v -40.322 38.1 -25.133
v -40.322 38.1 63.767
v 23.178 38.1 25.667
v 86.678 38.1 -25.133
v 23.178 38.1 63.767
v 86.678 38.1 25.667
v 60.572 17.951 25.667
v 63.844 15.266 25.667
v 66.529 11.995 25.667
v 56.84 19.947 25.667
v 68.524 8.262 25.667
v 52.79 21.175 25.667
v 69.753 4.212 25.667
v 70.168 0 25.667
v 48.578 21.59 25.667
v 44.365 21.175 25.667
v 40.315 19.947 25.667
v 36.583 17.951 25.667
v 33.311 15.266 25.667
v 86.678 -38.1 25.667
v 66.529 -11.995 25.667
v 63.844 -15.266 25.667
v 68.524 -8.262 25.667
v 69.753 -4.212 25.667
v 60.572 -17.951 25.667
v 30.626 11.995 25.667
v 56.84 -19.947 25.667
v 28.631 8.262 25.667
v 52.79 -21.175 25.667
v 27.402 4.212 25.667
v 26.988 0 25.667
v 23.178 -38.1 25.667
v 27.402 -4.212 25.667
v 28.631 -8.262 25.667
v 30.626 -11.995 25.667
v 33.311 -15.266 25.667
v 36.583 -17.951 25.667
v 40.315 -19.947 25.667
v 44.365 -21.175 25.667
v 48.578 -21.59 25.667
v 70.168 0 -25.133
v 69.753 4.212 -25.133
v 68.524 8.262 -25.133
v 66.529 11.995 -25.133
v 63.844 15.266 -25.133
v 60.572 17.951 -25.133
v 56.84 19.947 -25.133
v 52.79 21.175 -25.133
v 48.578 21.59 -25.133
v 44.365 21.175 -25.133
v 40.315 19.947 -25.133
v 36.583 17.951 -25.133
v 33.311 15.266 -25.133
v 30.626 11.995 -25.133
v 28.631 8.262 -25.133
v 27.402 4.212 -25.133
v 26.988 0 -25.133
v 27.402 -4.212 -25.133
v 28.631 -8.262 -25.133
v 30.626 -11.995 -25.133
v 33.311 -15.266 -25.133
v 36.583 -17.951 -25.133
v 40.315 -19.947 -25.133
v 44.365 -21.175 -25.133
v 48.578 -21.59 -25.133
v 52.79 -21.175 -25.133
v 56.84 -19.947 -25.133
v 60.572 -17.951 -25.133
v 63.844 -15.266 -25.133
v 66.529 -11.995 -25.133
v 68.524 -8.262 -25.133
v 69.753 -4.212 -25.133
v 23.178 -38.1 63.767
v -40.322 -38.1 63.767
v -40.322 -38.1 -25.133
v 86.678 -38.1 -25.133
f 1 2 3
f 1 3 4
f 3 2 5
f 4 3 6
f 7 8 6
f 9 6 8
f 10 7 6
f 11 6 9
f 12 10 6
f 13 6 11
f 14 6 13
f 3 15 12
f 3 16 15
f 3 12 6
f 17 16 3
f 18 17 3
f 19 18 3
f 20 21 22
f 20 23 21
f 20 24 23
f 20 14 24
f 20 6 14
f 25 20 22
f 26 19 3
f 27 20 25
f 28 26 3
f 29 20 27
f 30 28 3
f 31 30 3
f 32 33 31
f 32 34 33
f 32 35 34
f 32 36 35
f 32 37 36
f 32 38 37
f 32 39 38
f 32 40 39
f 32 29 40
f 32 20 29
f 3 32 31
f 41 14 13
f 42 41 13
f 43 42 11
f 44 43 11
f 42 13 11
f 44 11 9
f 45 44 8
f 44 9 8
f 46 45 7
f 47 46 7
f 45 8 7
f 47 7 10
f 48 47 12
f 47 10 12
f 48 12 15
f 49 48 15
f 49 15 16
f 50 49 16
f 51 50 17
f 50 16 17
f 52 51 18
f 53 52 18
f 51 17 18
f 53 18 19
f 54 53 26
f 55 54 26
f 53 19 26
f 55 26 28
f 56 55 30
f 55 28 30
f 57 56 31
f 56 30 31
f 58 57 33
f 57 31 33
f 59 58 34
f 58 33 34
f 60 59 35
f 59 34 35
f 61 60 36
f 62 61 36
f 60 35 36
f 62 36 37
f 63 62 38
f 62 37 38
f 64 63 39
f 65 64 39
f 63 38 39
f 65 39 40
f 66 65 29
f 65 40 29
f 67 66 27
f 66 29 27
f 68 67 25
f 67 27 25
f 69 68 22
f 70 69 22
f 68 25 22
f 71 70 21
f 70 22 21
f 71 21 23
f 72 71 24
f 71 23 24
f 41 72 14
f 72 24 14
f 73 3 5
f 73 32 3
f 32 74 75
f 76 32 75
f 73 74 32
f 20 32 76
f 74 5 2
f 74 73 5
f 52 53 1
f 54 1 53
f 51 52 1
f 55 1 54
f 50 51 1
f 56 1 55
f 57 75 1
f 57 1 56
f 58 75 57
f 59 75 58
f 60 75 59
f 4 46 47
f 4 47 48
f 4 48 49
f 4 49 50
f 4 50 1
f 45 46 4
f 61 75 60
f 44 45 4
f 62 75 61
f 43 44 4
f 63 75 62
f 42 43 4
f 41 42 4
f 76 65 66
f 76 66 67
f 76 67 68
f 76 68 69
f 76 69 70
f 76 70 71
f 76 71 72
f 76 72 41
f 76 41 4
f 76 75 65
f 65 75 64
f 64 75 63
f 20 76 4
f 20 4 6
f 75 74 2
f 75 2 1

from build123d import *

# Parameters (mm, degrees)
F1_DEPTH      = 38.1
F1_DEPTH_BACK = 38.1
F2_R          = 21.59
F3_DEPTH      = 50.8


with BuildPart() as f1:
    # F0 (on Front) → F1 (new body, two sides)
    with BuildSketch(Plane.XZ) as f1_sk:
        Polygon((23.1775, 63.766758), (-40.3225, 63.766758), (-40.3225, -25.133242), (23.1775, -25.133242), (86.6775, -25.133242), (86.6775, 25.666758), (23.1775, 25.666758), align=None)
    extrude(amount=F1_DEPTH)
    extrude(f1_sk.sketch, amount=-F1_DEPTH_BACK)

    # F2 (on face) → F3 (cut, through all)
    with BuildSketch(Plane.XY.offset(25.666758)):
        with Locations((48.5775, 0)):
            Circle(F2_R)
    extrude(amount=-F3_DEPTH, mode=Mode.SUBTRACT)


solid = f1.part
